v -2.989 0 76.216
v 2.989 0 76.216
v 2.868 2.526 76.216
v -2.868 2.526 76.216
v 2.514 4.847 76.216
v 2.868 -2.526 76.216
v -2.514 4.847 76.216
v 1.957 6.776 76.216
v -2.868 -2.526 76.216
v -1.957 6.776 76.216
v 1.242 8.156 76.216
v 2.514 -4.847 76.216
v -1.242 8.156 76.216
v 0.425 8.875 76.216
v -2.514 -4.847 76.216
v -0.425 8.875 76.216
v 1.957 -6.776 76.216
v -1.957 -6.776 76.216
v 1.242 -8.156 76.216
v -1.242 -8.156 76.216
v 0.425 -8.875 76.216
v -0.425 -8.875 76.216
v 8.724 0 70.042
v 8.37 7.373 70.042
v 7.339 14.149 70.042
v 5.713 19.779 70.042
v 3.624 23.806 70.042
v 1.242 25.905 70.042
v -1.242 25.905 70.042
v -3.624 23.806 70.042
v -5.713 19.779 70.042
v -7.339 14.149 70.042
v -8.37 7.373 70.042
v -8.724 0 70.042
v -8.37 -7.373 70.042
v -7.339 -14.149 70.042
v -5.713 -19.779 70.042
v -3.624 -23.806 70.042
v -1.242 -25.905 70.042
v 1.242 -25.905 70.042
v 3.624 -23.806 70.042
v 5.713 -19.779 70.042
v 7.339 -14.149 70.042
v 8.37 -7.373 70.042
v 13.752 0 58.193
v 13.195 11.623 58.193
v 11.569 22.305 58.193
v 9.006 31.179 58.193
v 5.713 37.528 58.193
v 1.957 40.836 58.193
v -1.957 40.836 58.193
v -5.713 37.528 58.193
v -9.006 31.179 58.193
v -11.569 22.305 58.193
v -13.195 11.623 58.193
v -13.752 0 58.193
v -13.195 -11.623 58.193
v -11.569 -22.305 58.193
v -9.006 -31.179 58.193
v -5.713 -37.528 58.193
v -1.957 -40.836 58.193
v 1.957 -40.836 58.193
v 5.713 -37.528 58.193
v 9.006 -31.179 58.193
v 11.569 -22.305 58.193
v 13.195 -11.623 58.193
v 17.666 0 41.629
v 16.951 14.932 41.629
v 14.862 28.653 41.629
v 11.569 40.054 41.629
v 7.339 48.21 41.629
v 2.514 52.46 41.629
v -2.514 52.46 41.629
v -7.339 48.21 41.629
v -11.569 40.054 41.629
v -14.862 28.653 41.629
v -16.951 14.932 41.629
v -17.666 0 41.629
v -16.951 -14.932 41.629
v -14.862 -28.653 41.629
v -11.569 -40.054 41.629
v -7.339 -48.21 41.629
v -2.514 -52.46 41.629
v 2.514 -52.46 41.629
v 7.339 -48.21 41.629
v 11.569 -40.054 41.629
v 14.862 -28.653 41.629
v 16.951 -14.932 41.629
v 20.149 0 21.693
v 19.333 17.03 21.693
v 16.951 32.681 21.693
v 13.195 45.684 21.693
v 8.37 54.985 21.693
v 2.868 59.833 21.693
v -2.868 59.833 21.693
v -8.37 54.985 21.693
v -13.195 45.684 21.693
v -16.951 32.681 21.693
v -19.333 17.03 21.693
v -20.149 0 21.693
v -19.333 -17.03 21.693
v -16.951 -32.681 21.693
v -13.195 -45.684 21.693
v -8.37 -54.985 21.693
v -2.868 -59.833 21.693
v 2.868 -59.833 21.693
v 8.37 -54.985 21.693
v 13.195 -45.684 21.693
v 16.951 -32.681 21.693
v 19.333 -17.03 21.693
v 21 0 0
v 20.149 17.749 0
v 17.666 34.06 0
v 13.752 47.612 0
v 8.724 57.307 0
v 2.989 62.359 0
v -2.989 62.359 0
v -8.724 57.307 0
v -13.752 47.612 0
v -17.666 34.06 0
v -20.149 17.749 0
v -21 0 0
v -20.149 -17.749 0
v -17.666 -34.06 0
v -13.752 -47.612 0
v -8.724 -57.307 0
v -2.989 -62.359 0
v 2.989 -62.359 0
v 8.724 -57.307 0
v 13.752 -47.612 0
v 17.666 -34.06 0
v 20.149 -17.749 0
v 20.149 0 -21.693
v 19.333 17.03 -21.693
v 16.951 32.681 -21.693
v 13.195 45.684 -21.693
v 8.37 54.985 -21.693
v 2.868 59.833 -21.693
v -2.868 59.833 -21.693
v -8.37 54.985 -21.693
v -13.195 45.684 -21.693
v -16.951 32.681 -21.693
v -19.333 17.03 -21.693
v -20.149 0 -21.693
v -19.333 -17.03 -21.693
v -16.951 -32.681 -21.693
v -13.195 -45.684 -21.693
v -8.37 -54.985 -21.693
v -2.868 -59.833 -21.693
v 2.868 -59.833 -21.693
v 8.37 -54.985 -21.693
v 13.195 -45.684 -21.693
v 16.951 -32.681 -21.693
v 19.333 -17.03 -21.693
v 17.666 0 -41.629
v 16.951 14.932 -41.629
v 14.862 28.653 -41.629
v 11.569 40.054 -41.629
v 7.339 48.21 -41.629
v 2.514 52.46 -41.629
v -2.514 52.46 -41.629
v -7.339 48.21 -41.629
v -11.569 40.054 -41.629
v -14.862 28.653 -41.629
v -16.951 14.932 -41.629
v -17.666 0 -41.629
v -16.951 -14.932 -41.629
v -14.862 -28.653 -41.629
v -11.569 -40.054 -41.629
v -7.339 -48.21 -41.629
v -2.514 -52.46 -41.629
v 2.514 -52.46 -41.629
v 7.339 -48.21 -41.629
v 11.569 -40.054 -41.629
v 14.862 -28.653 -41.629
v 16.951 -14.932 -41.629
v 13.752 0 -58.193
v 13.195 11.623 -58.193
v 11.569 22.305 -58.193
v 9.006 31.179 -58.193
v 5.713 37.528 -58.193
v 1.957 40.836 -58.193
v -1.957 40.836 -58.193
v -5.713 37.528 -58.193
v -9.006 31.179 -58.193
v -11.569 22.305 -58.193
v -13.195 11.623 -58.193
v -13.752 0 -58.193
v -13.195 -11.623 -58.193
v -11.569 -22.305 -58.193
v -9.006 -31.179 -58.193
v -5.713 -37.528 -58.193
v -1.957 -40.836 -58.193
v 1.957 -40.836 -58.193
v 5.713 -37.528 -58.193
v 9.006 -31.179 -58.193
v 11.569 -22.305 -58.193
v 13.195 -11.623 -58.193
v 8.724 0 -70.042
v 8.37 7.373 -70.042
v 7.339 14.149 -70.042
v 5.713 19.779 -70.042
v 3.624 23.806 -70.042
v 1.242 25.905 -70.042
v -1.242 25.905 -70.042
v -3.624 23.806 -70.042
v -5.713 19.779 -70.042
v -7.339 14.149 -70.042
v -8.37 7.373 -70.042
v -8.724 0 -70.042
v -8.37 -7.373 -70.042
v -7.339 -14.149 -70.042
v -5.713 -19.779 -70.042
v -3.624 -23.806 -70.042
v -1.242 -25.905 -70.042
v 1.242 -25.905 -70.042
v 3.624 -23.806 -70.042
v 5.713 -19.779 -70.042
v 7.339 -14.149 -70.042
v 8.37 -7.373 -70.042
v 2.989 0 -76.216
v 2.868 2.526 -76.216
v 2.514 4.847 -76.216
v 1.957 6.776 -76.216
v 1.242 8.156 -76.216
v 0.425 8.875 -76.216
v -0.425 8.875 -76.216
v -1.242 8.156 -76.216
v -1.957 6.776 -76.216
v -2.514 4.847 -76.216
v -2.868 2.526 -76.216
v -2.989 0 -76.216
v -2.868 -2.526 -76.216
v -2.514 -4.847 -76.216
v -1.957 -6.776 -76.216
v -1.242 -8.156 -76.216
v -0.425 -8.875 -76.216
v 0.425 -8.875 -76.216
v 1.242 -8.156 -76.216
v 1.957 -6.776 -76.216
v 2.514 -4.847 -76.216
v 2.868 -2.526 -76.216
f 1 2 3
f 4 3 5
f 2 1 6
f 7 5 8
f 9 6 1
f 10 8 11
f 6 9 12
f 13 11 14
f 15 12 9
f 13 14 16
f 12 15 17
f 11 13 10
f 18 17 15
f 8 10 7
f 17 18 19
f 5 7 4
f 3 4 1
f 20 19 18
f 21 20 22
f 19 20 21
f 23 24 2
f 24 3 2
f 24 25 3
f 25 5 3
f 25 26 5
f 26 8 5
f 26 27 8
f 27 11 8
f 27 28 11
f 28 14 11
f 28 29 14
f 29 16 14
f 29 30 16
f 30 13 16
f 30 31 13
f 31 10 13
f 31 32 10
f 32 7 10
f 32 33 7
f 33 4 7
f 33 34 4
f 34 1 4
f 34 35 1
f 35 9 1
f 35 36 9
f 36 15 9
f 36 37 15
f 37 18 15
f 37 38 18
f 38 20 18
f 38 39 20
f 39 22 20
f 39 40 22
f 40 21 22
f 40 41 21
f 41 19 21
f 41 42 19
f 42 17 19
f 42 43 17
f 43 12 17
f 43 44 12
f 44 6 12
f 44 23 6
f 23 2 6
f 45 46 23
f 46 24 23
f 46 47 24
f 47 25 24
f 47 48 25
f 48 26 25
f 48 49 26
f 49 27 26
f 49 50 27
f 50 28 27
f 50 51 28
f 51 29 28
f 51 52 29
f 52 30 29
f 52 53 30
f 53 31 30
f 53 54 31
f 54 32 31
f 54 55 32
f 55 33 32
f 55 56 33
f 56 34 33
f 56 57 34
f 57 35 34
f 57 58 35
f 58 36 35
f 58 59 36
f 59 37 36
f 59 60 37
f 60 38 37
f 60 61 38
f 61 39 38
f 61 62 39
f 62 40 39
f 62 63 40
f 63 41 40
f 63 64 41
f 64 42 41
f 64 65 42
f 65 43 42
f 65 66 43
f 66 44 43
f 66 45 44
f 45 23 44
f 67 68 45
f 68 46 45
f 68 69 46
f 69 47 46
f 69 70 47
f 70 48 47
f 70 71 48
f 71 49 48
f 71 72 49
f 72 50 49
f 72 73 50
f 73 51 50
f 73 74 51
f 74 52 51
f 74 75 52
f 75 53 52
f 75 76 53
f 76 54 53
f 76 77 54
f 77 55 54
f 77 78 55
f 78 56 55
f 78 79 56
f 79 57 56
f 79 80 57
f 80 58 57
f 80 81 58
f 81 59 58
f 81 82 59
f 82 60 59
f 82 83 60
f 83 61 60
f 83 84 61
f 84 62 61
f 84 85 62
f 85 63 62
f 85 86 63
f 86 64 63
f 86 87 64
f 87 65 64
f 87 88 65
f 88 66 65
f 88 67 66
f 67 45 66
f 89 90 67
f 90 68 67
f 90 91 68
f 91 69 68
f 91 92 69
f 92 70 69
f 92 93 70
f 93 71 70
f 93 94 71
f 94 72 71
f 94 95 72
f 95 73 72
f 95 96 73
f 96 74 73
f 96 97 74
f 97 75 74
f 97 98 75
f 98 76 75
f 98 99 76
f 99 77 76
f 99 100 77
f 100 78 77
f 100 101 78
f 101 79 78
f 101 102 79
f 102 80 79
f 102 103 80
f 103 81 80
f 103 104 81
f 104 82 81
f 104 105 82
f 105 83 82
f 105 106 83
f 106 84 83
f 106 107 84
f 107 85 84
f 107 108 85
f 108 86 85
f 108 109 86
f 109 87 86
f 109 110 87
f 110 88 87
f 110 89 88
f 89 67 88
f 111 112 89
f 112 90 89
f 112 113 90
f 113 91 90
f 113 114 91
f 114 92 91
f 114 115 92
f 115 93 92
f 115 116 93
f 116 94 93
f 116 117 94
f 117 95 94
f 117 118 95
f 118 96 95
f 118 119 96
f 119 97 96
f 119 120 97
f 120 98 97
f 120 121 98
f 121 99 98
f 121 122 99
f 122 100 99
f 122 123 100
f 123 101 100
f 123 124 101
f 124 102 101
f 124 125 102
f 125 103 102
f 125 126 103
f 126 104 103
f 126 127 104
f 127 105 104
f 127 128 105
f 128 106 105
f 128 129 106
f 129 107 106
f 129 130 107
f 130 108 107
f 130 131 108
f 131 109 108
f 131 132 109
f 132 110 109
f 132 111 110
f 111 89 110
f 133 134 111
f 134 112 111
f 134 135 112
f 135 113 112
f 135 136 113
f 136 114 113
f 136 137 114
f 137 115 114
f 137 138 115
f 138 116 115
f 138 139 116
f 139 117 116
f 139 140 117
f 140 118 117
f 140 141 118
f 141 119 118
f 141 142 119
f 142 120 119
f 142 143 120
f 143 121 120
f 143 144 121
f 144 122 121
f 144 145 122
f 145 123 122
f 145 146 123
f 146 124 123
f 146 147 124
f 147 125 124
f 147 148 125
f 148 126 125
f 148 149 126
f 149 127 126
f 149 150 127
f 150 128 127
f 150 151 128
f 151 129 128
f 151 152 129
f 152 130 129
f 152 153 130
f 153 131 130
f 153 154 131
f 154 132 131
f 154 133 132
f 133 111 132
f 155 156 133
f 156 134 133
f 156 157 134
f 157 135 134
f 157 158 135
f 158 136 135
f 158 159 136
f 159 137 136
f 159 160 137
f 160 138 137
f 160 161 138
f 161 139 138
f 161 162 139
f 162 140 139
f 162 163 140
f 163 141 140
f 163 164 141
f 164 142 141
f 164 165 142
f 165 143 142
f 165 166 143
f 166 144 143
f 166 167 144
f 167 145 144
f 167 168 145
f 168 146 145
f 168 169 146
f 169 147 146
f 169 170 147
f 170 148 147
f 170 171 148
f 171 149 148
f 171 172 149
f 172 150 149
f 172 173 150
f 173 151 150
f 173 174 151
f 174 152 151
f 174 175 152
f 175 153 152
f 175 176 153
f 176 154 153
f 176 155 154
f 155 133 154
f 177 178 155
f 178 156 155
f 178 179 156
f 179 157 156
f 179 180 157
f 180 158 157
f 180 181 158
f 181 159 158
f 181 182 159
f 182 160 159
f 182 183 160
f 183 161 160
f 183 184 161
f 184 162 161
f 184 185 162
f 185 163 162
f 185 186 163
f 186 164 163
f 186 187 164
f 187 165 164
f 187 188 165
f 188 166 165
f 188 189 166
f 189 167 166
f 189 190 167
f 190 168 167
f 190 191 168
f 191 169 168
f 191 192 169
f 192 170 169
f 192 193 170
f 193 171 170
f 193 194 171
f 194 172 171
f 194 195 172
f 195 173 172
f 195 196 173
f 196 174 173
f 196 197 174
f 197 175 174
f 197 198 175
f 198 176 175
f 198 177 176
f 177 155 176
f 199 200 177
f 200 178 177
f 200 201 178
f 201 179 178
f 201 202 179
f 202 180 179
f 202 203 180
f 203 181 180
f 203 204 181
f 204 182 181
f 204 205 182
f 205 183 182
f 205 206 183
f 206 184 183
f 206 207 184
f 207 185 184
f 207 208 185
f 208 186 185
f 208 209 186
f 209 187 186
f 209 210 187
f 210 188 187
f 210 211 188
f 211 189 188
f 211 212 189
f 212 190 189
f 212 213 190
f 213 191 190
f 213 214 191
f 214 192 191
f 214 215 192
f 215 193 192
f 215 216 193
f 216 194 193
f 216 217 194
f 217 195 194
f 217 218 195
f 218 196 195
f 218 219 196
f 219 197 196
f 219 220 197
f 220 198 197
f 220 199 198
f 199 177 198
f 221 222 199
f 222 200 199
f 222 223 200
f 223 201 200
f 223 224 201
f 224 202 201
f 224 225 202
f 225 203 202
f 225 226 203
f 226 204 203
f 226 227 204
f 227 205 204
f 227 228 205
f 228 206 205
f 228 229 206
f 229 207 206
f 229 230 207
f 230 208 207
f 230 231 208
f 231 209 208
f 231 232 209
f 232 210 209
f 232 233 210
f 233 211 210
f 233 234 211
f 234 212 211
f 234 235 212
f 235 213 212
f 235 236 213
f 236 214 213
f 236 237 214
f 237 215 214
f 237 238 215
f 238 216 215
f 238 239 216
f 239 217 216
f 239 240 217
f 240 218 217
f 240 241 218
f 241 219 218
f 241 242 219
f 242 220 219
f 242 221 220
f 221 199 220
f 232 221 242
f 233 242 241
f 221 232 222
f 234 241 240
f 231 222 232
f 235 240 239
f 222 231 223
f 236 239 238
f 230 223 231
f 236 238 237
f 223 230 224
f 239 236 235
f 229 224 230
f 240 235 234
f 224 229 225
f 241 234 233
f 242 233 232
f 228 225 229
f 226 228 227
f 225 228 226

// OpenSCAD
// Generated by SolidPython 1.0.1 on 2020-07-29 00:46:45


scale(v = [3, 9, 11]) {
	sphere(r = 7);
}
/***********************************************
*********      SolidPython code:      **********
************************************************
 
# import packages: SolidPython
from solid import *
from solid.utils import *
from itertools import chain, combinations, permutations


class Resize:

    def __init__(self, scad_file):
        self.scad_file = scad_file
        #self.scad_file = import_scad(scad_file)
        # cone/cylinder param:
        self.r1 = 0
        self.r2 = 0
        self.h = 0
        # rectangular prism param:
        self.w = 0
        self.l = 0
        # ellipse param:
        self.r = 0

    # import OpenScad code (file name corresponds to shape)


    # classify shape + parameters
    def assign(self, param1, param2, param3):
        if self.scad_file == 'cone.scad':
            self.r1 = param1
            self.r2 = param2
            self.h = param3
        elif self.scad_file == 'cylinder.scad':
            self.r1 = param1
            self.r2 = param2
            self.h = param3
        elif self.scad_file == 'rectangularPrism.scad':
            self.h = param1
            self.l = param2
            self.w = param3
        else:
            self.r = param1
            self.h = param2

    # resize parameters
    def iterate(self):
        x = range(3, 20, 2)
        i = 1
        if self.scad_file == 'cone.scad':
            tempList = list(permutations(x, 2))
            for temp in tempList:
                param1 = temp[0]
                param2 = temp[1]
                filepath = 'produced_scad_files/' + 'cone' + str(param1) + '_' + str(param2) + '_' + '.scad'
                scad_render_to_file(cylinder(h=param1, r1=param2, r2=0), filepath)

        elif self.scad_file == 'cylinder.scad':
            tempList = list(permutations(x, 3))
            for temp in tempList:
                param1 = temp[0]
                param2 = temp[1]
                filepath = 'produced_scad_files/' + 'cylinder' + str(param1) + '_' + str(param2) + '_' + '.scad'
                scad_render_to_file(cylinder(h=param1, r1=param2, r2=param2), filepath)

        elif self.scad_file == 'rectangularPrism.scad':
            tempList = list(permutations(x, 3))
            for temp in tempList:
                param1 = temp[0]
                param2 = temp[1]
                param3 = temp[2]
                filepath = 'produced_scad_files/' + 'rectangularPrism' + str(param1) + '_' + str(param2) + '_' + str(
                    param3) + '.scad'
                scad_render_to_file(cube(size=(param1, param2, param3)), filepath)

        elif self.scad_file == 'ellipse.scad':
            tempList = list(permutations(x, 4))
            for temp in tempList:
                param1 = temp[0]
                param2 = temp[1]
                param3 = temp[2]
                param4 = temp[3]
                filepath = 'produced_scad_files/' + 'ellipse' + str(param1) + '_' + str(param2) + '_' + str(param3) + '_' + str(param4) + '.scad'
                scad_render_to_file(scale([param1, param2, param3])(sphere(r=param4)), filepath)

    def render_to_scadfile(self):
        scad_render_to_file(scad, 'example.scad') 
 
************************************************/
